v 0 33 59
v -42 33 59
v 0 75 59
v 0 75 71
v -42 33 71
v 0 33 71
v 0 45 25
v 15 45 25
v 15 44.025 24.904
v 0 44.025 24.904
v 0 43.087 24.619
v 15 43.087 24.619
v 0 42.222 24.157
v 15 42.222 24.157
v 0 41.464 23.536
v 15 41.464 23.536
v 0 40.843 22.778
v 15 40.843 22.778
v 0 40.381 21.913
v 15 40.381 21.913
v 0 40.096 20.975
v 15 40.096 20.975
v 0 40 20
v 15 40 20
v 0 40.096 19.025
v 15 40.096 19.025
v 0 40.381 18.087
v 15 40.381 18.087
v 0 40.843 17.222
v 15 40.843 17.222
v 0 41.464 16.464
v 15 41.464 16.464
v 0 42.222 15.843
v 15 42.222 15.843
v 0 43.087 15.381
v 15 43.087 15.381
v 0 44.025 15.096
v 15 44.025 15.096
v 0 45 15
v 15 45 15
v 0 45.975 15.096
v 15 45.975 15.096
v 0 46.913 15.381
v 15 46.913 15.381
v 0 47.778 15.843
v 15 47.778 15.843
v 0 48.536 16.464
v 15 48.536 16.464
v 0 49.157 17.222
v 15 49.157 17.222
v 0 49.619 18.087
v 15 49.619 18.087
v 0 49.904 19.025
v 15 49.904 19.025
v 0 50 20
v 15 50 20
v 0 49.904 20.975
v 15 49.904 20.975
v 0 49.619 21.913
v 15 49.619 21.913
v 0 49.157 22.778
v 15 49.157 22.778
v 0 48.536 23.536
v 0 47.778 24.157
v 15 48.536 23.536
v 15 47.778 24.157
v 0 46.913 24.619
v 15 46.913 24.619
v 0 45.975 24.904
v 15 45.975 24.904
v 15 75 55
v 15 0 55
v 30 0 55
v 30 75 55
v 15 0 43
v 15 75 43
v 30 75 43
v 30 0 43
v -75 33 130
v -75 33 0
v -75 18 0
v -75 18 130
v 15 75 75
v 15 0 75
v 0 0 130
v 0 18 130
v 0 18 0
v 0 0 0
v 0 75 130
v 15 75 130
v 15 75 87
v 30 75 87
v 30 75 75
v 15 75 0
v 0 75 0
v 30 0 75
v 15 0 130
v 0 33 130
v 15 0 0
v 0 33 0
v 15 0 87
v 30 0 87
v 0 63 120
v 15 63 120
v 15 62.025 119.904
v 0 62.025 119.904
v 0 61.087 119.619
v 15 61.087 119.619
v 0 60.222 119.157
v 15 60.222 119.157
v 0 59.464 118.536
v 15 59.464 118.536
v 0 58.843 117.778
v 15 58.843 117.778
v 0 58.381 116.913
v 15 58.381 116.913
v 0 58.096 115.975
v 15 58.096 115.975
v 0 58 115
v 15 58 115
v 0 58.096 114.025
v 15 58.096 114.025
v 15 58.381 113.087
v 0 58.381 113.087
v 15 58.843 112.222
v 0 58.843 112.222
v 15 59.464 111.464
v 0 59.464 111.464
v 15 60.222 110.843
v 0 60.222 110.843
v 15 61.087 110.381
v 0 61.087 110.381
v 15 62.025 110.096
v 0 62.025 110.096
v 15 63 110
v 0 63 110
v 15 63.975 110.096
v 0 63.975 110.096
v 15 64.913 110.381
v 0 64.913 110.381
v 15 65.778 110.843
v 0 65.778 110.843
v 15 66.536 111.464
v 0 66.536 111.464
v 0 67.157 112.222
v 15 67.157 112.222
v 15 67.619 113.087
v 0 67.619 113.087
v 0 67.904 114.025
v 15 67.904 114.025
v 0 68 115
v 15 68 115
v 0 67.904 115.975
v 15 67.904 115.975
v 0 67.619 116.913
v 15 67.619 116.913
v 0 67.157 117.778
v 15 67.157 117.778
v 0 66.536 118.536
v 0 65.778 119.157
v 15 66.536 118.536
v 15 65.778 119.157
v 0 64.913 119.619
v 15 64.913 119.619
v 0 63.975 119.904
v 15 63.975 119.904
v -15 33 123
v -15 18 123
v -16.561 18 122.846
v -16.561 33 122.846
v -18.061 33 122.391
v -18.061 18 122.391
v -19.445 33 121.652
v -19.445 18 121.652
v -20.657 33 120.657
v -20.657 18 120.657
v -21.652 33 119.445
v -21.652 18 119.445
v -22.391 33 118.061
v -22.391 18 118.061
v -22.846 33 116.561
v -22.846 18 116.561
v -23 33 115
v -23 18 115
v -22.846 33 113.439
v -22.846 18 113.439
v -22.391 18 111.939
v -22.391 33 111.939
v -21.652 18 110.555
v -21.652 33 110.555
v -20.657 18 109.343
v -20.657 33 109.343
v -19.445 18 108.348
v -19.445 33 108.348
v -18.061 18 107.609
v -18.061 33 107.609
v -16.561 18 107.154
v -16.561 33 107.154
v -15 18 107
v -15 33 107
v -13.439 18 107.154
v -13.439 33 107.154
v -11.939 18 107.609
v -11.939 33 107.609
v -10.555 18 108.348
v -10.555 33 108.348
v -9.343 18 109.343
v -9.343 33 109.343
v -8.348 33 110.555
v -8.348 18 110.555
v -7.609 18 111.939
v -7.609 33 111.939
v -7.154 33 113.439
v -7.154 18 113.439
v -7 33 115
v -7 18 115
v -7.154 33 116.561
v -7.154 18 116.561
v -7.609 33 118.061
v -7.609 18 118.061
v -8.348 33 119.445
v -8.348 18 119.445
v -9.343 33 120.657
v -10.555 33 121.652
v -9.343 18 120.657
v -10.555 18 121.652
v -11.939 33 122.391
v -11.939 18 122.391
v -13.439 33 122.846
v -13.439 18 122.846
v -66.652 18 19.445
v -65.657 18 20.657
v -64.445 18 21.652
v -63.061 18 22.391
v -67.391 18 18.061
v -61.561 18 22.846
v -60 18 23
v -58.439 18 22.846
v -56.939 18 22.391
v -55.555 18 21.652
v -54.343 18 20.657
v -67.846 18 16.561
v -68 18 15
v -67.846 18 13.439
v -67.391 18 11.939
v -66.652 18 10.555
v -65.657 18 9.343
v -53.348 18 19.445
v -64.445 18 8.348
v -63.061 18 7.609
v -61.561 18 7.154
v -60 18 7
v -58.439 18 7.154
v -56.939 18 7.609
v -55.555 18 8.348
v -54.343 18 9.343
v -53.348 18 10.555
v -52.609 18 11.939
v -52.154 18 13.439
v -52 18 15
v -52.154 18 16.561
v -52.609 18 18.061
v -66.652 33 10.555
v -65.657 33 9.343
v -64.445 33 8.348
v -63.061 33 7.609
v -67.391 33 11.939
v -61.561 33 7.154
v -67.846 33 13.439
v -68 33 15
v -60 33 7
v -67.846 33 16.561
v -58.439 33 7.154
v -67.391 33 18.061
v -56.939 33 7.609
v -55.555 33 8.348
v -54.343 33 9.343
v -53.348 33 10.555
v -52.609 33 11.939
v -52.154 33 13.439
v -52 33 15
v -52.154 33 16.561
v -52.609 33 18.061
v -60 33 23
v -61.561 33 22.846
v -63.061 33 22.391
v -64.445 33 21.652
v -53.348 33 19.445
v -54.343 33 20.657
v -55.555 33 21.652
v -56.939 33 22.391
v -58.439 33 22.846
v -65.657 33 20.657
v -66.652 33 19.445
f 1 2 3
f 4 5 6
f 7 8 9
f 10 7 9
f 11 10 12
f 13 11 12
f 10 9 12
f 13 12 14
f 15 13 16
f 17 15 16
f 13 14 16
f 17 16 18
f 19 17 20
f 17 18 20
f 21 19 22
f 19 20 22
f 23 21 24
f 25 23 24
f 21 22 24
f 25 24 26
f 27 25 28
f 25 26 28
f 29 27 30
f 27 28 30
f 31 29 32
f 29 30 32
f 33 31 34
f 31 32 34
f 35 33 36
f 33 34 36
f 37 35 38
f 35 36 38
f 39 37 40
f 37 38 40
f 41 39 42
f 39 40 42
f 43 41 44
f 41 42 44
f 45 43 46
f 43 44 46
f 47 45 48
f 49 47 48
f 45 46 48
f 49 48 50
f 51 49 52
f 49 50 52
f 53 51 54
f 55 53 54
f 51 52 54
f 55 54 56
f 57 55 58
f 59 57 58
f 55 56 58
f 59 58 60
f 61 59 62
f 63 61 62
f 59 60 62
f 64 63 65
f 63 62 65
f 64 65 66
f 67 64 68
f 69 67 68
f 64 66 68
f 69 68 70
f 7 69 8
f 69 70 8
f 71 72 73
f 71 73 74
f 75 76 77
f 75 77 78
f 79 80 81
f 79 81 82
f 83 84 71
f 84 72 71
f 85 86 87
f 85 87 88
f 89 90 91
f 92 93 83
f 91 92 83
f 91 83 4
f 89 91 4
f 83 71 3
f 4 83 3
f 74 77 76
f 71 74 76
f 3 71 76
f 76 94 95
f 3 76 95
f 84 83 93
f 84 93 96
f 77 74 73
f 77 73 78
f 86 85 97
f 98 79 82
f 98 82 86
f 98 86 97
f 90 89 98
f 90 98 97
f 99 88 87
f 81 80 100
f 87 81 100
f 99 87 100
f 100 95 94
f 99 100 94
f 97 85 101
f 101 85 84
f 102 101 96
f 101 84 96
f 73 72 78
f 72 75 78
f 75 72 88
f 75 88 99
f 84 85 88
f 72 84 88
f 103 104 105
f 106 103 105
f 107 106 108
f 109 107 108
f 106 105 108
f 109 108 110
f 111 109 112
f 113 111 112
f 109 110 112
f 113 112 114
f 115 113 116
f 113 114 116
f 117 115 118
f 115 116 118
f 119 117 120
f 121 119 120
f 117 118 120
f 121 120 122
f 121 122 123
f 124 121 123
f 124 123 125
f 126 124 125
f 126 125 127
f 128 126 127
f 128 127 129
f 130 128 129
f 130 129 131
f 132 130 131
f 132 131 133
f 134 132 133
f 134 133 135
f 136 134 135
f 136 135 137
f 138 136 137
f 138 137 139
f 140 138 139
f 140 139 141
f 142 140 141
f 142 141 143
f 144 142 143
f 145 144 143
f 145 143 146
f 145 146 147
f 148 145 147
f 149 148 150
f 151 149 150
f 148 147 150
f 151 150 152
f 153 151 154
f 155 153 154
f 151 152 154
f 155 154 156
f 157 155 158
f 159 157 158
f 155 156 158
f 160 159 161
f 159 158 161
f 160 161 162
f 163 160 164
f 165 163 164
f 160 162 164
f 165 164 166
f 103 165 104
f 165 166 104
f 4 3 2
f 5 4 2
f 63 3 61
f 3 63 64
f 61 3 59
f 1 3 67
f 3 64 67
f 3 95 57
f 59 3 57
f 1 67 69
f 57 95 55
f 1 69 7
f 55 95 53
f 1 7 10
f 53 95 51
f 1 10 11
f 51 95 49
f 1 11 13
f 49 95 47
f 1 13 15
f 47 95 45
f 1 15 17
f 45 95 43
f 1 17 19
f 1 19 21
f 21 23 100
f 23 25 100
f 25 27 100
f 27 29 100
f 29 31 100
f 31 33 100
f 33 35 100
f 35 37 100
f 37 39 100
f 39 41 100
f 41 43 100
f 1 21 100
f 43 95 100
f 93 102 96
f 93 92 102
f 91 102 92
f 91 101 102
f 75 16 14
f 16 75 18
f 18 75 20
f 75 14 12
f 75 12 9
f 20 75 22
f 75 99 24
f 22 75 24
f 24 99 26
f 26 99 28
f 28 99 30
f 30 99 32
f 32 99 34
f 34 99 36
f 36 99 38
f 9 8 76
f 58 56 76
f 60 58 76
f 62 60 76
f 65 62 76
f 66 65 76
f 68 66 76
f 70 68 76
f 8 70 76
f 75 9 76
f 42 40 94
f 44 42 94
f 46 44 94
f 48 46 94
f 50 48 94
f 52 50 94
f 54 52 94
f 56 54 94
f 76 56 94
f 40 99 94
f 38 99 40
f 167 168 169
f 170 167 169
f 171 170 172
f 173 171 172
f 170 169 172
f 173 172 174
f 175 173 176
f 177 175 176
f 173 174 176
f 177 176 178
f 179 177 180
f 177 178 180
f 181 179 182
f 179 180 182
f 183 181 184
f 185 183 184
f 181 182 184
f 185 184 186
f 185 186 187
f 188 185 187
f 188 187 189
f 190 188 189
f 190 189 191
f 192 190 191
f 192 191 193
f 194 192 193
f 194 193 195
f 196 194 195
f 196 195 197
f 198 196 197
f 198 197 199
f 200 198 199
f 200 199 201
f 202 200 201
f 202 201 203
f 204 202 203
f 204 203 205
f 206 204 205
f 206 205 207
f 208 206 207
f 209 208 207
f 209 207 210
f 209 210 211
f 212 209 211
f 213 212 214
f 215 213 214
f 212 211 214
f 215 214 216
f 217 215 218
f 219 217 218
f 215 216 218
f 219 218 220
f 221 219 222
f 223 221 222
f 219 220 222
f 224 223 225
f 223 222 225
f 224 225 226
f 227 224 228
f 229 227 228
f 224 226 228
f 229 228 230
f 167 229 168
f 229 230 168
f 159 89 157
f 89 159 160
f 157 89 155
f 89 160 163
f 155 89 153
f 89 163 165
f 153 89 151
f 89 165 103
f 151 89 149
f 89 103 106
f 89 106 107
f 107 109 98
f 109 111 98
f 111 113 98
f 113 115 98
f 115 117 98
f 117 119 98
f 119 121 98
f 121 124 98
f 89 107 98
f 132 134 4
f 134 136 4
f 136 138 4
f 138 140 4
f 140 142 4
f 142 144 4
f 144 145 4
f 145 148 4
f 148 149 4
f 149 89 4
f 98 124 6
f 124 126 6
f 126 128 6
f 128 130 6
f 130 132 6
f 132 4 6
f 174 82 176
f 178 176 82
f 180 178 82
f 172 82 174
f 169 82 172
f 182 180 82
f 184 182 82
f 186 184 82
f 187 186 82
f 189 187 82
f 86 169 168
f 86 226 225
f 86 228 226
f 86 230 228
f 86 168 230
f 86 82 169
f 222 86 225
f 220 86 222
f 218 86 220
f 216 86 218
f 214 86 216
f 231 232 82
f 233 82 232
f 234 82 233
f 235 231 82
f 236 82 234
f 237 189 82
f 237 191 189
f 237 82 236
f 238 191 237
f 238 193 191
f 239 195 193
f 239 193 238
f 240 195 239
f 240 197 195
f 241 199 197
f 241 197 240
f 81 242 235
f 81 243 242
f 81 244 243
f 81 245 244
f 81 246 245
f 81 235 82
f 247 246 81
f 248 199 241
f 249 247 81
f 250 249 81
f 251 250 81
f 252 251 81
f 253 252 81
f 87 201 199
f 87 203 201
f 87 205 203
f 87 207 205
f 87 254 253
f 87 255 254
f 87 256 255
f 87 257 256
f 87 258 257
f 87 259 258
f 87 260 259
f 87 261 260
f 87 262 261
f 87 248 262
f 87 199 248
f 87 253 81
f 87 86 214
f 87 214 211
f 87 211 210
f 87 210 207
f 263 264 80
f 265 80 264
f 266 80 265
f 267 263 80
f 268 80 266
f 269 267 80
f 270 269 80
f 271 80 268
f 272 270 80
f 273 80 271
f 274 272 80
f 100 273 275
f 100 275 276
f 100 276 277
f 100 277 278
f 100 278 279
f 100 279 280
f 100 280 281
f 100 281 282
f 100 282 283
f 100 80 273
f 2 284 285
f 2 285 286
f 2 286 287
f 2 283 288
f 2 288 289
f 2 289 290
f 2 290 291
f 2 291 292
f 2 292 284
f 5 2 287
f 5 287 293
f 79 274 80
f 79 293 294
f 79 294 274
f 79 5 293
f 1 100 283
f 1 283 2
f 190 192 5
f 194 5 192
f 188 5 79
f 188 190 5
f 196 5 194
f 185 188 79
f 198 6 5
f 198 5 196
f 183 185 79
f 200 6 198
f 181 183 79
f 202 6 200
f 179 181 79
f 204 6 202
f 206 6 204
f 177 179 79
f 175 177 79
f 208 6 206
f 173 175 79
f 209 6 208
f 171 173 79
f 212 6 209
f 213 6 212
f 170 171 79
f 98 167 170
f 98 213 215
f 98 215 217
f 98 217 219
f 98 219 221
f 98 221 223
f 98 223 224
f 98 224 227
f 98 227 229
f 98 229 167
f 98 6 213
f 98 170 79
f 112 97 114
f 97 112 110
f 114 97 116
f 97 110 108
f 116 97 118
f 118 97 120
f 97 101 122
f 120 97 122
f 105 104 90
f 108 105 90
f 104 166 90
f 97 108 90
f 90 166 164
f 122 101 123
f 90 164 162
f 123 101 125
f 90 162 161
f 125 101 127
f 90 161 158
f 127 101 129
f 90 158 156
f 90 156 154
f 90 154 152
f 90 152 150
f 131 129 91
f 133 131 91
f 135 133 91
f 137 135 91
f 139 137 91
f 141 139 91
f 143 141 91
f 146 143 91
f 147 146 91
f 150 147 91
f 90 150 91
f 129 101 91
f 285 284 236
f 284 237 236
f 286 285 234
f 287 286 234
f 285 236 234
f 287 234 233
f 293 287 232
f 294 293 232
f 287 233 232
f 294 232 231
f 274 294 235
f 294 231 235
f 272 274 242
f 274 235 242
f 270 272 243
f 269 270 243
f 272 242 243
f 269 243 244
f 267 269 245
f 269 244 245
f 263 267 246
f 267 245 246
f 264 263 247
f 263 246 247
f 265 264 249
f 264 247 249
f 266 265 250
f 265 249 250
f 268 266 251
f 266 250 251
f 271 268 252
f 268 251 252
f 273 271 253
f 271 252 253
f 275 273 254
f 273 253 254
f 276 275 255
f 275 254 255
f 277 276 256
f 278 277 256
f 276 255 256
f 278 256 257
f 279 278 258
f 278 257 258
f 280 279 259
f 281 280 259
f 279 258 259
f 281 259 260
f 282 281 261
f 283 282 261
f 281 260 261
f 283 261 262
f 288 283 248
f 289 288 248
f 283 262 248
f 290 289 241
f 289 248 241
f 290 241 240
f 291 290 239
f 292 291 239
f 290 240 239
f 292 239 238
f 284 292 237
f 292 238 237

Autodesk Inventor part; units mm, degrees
ref_plane "YZ Plane" through (0, 0, 0) normal (1, 0, 0) x (0, 1, 0)
ref_plane "XZ Plane" through (0, 0, 0) normal (0, 1, 0) x (-1, 0, 0)
sketch "Skizze1" plane through (0, 0, 0) normal (0, 0, 1) x (1, 0, 0)
  line L0 (0, 0) -> (15, 0)
  line L1 (15, 0) -> (15, 75)
  line L2 (15, 75) -> (0, 75)
  line L3 (0, 75) -> (0, 0)
  dimension "d0" = 15
  dimension "d1" = 75
extrude "Extrusion1" add sketch "Skizze1" along normal blind 130
sketch "Skizze2" plane through (0, 0, 0) normal (-1, 0, 0) x (0, 0, 1)
  line L0 (0, 0) -> (0, 75) projected
  line L1 (130, 0) -> (130, 75) projected
  line L2 (0, 33) -> (130, 33)
  line L3 (130, 33) -> (130, 18)
  line L4 (130, 18) -> (0, 18)
  line L5 (0, 18) -> (0, 33)
  line L6 (0, 0) -> (130, 0) projected
  point P0 (0, 18)
  dimension "d4" = 15
  dimension "d5" = 18
extrude "Extrusion2" add sketch "Skizze2" along normal blind 75 contours L0 L2 L1 L4
ref_plane "Arbeitsebene1" through (0, 0, 65) normal (0, 0, 1) x (1, 0, 0)
sketch "Skizze4" plane through (0, 0, 65) normal (0, 0, 1) x (1, 0, 0)
  line L0 (0, 75) -> (0, 33) projected
  line L1 (0, 75) -> (-42, 33)
  line L2 (0, 33) -> (-75, 33) projected
  point P0 (0, 0)
  dimension "d9" = 45
extrude "Extrusion3" add sketch "Skizze4" along normal mid plane 12
sketch "Skizze5" plane through (15, 0, 0) normal (1, 0, 0) x (0, 0, -1)
  line L0 (0, 75) -> (-130, 75) projected
  line L1 (-87, 75) -> (-75, 75)
  line L2 (-75, 75) -> (-75, 0)
  line L3 (-75, 0) -> (-87, 0)
  line L4 (-87, 0) -> (-87, 75)
  point P0 (0, 0)
  point P1 (-65, 75)
  dimension "d12" = 12
  dimension "d13" = 10
  dimension "d14" = 75
extrude "Extrusion4" add sketch "Skizze5" along normal blind 15
mirror "Spiegeln1" about plane through (0, 0, 65) normal (0, 0, 1) of "Extrusion4"
sketch "Skizze6" plane through (0, 33, 0) normal (-1, 0, 0) x (0, 0, 1)
  line L0 (0, 42) -> (59, 42) projected
  line L1 (0, 42) -> (0, 0) projected
  point P0 (0, -33)
  point P1 (20, 12)
  dimension "d24" = 30
  dimension "d25" = 20
hole "Bohrung1" at (0, 45, 20) direction (1, 0, 0) diameter 10 depth 15
sketch "Skizze7" plane through (0, 33, 130) normal (-1, 0, 0) x (0, 0, 1)
  line L0 (0, 0) -> (-130, 0) projected
  line L1 (0, 42) -> (0, 0) projected
  point P0 (-130, -33)
  point P1 (-15, 30)
  dimension "d33" = 30
  dimension "d34" = 15
hole "Bohrung" at (0, 63, 115) direction (1, 0, 0) diameter 10 end through all
sketch "Skizze8" plane through (-75, 33, 0) normal (0, 1, 0) x (1, 0, 0)
  line L0 (75, 0) -> (0, 0) projected
  line L1 (0, -130) -> (0, 0) projected
  point P0 (15, -15)
  dimension "d42" = 15
  dimension "d43" = 15
hole "Bohrung3" at (-60, 33, 15) direction (0, -1, 0) diameter 16 end through all
sketch "Skizze9" plane through (-75, 33, 0) normal (0, 1, 0) x (1, 0, 0)
  line L0 (75, -130) -> (0, -130) projected
  line L1 (75, -71) -> (75, -130) projected
  point P0 (75, 0)
  point P1 (60, -115)
  dimension "d51" = 15
  dimension "d52" = 15
hole "Bohrung4" at (-15, 33, 115) direction (0, -1, 0) diameter 16 end through all
properties part number "lager" material "Edelstahl AISI 202"
